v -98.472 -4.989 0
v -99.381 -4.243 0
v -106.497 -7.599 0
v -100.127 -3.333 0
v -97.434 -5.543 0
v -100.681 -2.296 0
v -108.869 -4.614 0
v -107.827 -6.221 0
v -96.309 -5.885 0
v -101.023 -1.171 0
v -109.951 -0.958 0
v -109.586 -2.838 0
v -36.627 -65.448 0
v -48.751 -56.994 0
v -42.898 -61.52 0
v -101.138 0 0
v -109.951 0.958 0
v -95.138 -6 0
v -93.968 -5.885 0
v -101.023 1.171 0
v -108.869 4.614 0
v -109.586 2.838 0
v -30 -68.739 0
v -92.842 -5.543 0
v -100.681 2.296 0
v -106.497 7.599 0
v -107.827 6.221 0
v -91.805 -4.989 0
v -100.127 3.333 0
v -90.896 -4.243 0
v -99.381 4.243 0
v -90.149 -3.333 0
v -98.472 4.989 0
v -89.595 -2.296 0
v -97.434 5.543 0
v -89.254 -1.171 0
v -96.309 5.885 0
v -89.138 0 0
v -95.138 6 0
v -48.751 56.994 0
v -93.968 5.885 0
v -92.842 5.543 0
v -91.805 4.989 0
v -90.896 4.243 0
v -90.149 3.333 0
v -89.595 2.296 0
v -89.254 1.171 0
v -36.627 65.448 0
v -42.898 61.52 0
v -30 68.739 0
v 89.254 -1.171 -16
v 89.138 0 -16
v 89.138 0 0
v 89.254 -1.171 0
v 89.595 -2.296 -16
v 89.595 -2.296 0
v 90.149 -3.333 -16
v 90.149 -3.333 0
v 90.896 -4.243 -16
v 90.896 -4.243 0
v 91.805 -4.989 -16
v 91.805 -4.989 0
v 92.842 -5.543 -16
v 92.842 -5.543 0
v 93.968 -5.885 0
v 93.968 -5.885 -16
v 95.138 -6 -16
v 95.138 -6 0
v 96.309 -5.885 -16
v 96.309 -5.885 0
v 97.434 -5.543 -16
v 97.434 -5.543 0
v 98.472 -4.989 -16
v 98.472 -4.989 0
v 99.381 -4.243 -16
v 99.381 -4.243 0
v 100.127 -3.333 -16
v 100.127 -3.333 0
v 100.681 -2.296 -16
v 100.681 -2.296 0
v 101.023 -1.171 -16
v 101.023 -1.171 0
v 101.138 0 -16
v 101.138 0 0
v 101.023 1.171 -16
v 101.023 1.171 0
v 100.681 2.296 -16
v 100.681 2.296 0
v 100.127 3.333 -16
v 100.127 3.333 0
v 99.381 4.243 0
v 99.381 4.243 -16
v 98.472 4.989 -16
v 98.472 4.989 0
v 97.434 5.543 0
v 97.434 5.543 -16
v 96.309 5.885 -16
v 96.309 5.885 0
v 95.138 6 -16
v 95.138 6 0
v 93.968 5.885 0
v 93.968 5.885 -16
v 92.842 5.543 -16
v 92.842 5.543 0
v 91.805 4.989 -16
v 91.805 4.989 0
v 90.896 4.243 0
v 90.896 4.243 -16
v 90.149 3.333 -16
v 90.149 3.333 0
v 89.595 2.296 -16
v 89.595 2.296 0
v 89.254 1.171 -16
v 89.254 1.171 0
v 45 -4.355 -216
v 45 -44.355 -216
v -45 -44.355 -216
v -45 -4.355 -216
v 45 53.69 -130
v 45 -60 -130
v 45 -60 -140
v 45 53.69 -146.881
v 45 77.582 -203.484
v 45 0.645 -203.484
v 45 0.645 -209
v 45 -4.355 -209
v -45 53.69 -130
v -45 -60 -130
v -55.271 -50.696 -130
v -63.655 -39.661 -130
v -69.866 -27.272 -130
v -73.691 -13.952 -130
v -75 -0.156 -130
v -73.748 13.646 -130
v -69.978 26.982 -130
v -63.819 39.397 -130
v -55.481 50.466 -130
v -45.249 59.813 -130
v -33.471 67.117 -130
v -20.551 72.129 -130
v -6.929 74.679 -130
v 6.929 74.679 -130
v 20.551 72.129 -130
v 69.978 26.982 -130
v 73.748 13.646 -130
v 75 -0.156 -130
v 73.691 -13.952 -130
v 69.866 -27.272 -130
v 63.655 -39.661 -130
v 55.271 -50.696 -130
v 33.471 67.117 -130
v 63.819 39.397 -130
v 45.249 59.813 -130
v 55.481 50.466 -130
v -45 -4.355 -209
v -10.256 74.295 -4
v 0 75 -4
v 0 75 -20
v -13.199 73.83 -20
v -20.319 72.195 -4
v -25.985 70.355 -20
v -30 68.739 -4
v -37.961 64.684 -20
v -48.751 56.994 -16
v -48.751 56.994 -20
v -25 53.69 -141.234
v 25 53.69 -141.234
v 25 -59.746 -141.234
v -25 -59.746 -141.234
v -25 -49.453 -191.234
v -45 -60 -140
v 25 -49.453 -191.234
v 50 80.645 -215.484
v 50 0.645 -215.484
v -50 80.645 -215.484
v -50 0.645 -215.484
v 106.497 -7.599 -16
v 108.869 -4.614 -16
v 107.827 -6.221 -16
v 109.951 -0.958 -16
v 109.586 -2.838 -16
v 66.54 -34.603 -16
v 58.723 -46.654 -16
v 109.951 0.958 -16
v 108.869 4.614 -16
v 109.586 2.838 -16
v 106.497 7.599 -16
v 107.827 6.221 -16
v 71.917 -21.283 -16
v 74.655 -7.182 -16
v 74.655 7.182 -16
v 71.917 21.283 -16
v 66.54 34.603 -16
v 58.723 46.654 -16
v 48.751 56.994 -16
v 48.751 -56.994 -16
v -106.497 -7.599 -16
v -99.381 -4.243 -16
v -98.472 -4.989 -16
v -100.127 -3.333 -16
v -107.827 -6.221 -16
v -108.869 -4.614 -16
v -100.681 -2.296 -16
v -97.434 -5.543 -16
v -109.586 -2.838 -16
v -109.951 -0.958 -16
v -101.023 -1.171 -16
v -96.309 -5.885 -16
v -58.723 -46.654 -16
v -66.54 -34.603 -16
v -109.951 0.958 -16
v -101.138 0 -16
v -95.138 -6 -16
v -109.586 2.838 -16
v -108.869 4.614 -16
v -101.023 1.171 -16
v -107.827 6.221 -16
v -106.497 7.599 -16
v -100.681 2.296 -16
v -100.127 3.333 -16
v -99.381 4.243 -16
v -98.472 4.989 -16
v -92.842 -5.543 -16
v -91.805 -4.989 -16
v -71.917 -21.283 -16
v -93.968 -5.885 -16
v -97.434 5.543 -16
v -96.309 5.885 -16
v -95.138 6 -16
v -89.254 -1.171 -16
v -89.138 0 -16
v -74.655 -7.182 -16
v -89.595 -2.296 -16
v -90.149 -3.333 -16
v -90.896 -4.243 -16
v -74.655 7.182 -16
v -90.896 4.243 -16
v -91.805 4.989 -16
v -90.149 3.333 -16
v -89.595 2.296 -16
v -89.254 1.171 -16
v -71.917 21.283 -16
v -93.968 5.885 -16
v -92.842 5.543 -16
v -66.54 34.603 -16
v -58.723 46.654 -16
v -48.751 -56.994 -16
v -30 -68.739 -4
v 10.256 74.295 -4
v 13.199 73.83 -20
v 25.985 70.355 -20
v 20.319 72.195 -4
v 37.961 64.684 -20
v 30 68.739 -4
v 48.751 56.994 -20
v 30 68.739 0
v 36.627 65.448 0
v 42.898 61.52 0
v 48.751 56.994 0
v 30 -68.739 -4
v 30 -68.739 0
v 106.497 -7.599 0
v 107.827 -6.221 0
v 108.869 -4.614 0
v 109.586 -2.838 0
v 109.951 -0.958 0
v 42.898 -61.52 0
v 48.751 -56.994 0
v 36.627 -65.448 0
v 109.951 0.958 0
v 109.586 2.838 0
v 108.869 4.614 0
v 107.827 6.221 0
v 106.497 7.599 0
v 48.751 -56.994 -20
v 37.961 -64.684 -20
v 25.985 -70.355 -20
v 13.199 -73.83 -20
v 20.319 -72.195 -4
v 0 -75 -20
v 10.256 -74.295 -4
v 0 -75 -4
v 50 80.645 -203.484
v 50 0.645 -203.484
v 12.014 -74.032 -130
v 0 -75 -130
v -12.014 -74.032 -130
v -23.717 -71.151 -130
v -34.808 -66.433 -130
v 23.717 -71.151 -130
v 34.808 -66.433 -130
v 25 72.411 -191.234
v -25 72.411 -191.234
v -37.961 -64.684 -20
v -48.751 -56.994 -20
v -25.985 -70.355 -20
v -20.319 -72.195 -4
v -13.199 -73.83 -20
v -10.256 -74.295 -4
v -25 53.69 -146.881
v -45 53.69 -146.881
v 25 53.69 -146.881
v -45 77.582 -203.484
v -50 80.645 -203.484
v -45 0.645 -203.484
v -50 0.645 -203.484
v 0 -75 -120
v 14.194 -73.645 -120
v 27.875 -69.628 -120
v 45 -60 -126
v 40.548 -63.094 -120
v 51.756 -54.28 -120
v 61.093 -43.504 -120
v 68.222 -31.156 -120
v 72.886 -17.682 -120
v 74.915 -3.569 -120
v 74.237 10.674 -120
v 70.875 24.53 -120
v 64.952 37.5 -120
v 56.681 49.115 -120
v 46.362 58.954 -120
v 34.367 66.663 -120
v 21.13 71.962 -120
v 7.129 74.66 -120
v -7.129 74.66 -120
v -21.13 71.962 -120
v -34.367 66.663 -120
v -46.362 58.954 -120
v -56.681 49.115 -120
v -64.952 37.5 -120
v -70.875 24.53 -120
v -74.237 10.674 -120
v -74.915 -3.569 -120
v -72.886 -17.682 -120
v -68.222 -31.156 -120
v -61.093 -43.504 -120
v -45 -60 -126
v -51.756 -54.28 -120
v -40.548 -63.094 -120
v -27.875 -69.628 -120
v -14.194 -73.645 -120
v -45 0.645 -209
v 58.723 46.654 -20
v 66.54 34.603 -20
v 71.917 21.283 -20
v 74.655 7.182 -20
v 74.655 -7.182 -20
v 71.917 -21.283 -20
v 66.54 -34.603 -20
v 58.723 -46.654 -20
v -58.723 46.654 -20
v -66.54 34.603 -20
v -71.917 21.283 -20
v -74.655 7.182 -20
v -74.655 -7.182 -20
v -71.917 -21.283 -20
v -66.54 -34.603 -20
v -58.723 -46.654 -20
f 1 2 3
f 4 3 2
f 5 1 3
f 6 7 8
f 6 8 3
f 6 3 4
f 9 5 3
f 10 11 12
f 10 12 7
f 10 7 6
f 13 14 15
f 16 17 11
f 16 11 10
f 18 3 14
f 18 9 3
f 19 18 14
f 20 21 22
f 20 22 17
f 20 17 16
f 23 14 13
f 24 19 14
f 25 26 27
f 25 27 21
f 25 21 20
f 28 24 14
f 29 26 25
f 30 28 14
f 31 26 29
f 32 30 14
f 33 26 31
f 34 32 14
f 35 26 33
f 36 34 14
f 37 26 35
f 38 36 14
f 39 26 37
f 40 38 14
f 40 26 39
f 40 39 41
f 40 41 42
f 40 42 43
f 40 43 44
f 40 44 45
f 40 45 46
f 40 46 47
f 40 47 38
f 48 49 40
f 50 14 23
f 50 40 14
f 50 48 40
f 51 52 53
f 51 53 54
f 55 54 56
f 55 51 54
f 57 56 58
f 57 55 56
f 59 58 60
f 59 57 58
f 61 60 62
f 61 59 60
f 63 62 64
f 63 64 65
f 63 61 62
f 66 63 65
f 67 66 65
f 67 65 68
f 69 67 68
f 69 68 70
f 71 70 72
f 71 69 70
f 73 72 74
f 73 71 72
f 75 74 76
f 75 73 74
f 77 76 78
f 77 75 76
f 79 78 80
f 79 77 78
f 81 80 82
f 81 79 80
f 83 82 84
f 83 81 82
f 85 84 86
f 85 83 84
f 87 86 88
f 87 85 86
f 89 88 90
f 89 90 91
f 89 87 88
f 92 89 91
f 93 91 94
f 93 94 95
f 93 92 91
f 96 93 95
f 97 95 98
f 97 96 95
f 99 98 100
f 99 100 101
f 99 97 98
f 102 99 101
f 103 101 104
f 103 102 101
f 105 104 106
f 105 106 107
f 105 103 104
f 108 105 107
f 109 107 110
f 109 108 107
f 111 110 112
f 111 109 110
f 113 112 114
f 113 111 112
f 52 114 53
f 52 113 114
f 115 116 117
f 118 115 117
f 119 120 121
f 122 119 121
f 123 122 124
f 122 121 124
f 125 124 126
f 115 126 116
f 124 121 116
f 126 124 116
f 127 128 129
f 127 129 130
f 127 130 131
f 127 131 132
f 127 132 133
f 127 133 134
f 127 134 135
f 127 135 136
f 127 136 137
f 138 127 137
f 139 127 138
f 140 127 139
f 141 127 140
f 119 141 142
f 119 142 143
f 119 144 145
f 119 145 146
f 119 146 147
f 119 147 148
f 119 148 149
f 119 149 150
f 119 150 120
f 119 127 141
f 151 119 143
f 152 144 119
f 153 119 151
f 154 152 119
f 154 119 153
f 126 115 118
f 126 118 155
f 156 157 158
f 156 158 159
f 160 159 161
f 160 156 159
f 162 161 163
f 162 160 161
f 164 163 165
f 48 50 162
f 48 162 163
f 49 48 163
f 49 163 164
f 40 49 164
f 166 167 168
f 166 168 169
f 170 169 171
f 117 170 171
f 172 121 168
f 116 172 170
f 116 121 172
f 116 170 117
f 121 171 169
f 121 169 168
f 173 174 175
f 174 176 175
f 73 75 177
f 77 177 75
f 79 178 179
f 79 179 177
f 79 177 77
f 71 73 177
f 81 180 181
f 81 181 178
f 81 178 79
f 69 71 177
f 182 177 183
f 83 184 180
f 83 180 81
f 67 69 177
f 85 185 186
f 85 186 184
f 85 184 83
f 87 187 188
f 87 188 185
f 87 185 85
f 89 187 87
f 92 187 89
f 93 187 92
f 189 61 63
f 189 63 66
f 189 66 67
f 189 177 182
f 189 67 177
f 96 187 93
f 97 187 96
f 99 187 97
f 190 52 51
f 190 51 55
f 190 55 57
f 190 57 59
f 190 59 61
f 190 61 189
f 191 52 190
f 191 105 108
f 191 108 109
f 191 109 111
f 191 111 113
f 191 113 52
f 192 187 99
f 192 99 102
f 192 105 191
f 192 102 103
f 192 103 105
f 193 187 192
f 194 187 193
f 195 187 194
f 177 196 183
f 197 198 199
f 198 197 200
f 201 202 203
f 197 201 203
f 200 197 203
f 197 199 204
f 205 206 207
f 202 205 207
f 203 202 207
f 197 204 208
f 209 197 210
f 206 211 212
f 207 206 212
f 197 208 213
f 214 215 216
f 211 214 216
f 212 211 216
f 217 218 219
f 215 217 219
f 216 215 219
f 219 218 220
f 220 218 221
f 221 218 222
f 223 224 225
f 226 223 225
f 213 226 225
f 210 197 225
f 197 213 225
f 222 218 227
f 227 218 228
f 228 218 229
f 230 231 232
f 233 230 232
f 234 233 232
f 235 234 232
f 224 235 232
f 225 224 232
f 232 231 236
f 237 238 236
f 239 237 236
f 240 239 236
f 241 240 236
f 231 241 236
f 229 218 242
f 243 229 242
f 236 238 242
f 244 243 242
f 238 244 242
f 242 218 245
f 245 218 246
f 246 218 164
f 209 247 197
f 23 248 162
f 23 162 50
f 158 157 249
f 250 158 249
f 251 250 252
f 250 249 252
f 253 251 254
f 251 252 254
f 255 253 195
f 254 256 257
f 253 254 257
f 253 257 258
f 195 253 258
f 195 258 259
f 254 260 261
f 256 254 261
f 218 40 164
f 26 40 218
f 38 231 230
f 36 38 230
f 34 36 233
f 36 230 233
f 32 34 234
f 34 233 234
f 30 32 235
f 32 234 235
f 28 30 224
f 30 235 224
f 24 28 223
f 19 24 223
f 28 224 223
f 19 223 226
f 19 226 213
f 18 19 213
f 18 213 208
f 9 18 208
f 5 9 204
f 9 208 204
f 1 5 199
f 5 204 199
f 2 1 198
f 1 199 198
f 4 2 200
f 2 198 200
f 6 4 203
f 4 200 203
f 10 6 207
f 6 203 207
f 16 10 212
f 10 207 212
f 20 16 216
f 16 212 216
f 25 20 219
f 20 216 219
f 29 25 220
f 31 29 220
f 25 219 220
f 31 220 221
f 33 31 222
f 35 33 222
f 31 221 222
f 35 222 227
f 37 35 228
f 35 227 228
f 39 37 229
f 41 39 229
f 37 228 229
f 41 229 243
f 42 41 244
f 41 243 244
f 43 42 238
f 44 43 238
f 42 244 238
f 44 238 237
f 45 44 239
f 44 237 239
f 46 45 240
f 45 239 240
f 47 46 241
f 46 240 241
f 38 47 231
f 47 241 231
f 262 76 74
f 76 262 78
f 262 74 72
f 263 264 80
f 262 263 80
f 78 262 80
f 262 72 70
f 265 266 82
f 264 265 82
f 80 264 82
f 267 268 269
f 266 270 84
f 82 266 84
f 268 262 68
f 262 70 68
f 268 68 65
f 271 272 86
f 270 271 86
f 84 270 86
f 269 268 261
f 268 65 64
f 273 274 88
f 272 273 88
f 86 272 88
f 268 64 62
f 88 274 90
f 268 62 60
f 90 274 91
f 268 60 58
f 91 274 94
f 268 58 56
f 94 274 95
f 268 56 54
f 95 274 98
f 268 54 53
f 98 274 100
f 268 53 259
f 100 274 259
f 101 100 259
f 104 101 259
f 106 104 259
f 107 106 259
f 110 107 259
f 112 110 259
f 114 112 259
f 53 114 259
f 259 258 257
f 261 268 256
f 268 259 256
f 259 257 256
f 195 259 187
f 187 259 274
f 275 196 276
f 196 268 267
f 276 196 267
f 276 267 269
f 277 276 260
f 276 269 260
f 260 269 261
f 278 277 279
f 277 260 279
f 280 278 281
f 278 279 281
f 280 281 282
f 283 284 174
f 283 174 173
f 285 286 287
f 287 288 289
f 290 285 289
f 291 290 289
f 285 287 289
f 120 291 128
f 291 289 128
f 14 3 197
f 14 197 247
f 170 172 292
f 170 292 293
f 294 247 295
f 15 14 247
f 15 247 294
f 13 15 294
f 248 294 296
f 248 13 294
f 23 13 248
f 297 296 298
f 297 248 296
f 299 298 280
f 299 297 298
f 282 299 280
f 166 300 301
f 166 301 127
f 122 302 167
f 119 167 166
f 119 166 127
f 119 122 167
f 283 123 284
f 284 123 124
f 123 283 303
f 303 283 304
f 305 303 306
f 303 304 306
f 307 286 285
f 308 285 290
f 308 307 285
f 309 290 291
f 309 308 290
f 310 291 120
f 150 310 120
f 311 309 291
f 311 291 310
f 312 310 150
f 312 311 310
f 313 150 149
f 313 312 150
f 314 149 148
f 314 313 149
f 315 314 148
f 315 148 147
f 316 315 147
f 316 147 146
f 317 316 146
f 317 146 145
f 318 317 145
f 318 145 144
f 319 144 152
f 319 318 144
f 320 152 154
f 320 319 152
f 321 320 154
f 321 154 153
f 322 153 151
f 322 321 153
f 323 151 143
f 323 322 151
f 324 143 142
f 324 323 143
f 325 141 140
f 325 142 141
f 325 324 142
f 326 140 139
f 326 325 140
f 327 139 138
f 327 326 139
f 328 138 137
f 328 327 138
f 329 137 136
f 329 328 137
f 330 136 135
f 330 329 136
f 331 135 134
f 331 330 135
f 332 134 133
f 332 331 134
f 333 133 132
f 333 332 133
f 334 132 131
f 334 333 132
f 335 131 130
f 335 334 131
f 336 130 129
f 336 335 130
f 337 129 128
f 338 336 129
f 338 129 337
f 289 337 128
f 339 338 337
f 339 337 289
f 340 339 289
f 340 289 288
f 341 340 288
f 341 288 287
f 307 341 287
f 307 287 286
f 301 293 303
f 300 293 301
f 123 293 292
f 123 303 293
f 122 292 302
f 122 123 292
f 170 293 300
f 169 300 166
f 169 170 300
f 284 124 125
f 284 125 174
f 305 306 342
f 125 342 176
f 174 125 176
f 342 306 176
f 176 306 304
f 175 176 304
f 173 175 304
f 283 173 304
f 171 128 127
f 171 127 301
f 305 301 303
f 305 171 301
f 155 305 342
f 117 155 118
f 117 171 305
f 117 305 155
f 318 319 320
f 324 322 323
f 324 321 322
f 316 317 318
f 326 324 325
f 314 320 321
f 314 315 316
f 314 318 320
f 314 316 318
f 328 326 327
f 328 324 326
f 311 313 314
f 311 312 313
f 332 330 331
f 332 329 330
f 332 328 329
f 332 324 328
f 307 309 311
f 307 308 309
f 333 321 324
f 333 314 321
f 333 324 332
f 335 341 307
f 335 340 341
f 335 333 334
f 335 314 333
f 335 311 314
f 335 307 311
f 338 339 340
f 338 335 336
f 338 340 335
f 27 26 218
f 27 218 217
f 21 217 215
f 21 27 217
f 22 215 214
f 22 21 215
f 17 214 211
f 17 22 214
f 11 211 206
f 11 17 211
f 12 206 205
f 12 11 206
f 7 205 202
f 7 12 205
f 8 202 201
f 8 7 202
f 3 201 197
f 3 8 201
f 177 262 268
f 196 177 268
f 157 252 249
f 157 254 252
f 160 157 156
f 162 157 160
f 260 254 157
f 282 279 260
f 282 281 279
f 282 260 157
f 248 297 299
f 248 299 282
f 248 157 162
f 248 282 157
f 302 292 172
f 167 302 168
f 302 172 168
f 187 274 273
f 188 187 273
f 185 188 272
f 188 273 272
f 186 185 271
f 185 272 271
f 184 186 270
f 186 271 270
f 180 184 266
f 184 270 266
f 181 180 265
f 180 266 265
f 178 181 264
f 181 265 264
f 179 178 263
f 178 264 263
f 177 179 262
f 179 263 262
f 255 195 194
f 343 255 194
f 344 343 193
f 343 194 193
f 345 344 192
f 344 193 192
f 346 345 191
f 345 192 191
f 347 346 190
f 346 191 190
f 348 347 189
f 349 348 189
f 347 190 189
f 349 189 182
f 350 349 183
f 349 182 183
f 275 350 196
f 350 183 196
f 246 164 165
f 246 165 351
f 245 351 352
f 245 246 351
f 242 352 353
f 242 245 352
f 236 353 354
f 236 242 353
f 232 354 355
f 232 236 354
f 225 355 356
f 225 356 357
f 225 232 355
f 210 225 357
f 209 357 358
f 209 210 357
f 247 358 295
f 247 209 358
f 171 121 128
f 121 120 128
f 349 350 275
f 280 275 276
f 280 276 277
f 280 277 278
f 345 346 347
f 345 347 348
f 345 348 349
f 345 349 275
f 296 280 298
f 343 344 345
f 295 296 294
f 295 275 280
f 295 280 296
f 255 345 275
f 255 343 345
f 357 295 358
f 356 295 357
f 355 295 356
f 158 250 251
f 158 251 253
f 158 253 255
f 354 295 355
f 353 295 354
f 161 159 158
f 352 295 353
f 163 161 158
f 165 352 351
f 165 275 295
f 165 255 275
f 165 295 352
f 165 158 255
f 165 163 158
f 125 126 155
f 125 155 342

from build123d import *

# Parameters (mm, degrees)
F1_DEPTH  = 16
F2_DEPTH  = 20
F3_R      = 6
F4_DEPTH  = 16
F5_W      = 30
F5_H      = 4
F6_DEPTH  = 75
F8_R      = 75
F9_DEPTH  = 10
F12_DEPTH = 60
F13_DEPTH = 77.8
F15_DEPTH = 100
F16_W     = 77.1548634648
F16_H     = 3
F17_DEPTH = 45
F19_DEPTH = 50
F20_W     = 25
F20_H     = 50
F21_DEPTH = 80
F22_DEPTH = 80


with BuildPart() as f1:
    # F0 (on Top) → F1 (new body)
    with BuildSketch(Plane.XY):
        with BuildLine():
            ThreePointArc((-48.751355202, -56.9939063933), (-75, 0), (-48.751355202, 56.9939063933))
            Line((-48.751355202, 56.9939063933), (-106.4974008694, 7.5991875191))
            ThreePointArc((-106.4974008694, 7.5991875191), (-109.9972201758, 0), (-106.4974008694, -7.5991875191))
            Line((-106.4974008694, -7.5991875191), (-48.751355202, -56.9939063933))
        make_face()
    extrude(amount=-F1_DEPTH)

    # F0 (on Top) → F2 (join)
    with BuildSketch(Plane.XY):
        with BuildLine():
            Line((0, -75), (0, 75))
            ThreePointArc((0, 75), (-25.9851594232, 70.354612427), (-48.751355202, 56.9939063933))
            ThreePointArc((-48.751355202, 56.9939063933), (-75, 0), (-48.751355202, -56.9939063933))
            ThreePointArc((-48.751355202, -56.9939063933), (-25.9851594232, -70.354612427), (0, -75))
        make_face()
    extrude(amount=-F2_DEPTH)

    # F3 (on face) → F4 (cut)
    with BuildSketch(Plane(origin=(0, 0, -16), x_dir=(1, 0, 0), z_dir=(0, 0, -1))):
        with Locations((-95.1382219791, 0)):
            Circle(F3_R)
    extrude(amount=-F4_DEPTH, mode=Mode.SUBTRACT)

    # F5 (on Front) → F6 (cut, symmetric)
    with BuildSketch(Plane.XZ):
        with Locations((-15, -2)):
            Rectangle(F5_W, F5_H)
    extrude(amount=F6_DEPTH, both=True, mode=Mode.SUBTRACT)

    # F7: F1 across face


with BuildPart() as f1_1:
    add(f1.part)
    add(f1.part.mirror(Plane(origin=(0, 0, -12), x_dir=(0, 1, 0), z_dir=(1, 0, 0))))


with BuildPart() as f9:
    # F8 (on face) → F9 (new body)
    with BuildSketch(Plane(origin=(0, 0, -20), x_dir=(1, 0, 0), z_dir=(0, 0, -1))):
        Circle(F8_R)
    extrude(amount=F9_DEPTH)


with BuildPart() as f9_1:
    # F10: moved
    add(f9.part.moved(Location((0, 0, -100))))

    # F11 (on Front) → F12 (join)
    with BuildSketch(Plane.XZ):
        Polygon((0, -126), (-45, -126), (-45, -216), (45, -216), (45, -126), align=None)
    extrude(amount=F12_DEPTH)

    # F13 (add): a face of the model
    f13_faces = [f9_1.faces().sort_by_distance(p)[0] for p in [
        (0, 0, -173),
    ]]
    extrude(f13_faces, amount=F13_DEPTH)

    # F14 (on face) → F15 (cut)
    with BuildSketch(Plane.XY.offset(-120)):
        with BuildLine():
            ThreePointArc((75, 0), (53.033008589, -53.033008589), (0, -75))
            Line((0, -75), (93.311317265, -75))
            Line((93.311317265, -75), (93.311317265, 95.2438786626))
            Line((93.311317265, 95.2438786626), (0, 95.2438786626))
            Line((0, 95.2438786626), (0, 75))
            ThreePointArc((0, 75), (53.033008589, 53.033008589), (75, 0))
        make_face()
        with BuildLine():
            Line((0, 75), (0, -75))
            ThreePointArc((0, -75), (53.033008589, -53.033008589), (75, 0))
            ThreePointArc((75, 0), (53.033008589, 53.033008589), (0, 75))
        make_face()
    extrude(amount=-F15_DEPTH, mode=Mode.SUBTRACT)

    # F16 (on face) → F17 (cut)
    with BuildSketch(Plane(origin=(-45, 0, 0), x_dir=(0, -1, 0), z_dir=(-1, 0, 0))):
        Polygon((-77.8, -130), (-77.8, -204), (-53.6902993917, -146.880954504), (-53.6902993917, -130), align=None)
        with Locations((-39.2225682676, -214.5)):
            Rectangle(F16_W, F16_H)
        Polygon((60, -216), (60, -140), (44.3548634648, -216), align=None)
        Polygon((-0.6451365352, -216), (4.3548634648, -216), (4.3548634648, -213), (4.3548634648, -209), (-0.6451365352, -209), (-0.6451365352, -213), align=None)
    extrude(amount=-F17_DEPTH, mode=Mode.SUBTRACT)

    # F18 (on face) → F19 (join)
    with BuildSketch(Plane.YZ):
        Polygon((80.6451365352, -203.4836058617), (77.8, -203.4836058617), (77.5820322808, -203.4836058617), (77.8, -204), (77.8, -213), (0.6451365352, -213), (0.6451365352, -215.4836058617), (80.6451365352, -215.4836058617), align=None)
        Polygon((77.8, -204), (77.5820322808, -203.4836058617), (0.6451365352, -203.4836058617), (0.6451365352, -209), (0.6451365352, -213), (77.8, -213), align=None)
    extrude(amount=-F19_DEPTH)

    # F20 (on Front) → F21 (cut)
    with BuildSketch(Plane.XZ):
        with Locations((-12.5, -166.2339031696)):
            Rectangle(F20_W, F20_H)
    extrude(amount=-F21_DEPTH, mode=Mode.SUBTRACT)

    # F22 (cut): a face of the model
    f22_faces = [f9_1.faces().sort_by_distance(p)[0] for p in [
        (-12.5, 0, -166.2339031696),
    ]]
    extrude(f22_faces, amount=-F22_DEPTH, mode=Mode.SUBTRACT)

    # F23: F9 across face


with BuildPart() as f9_2:
    add(f9_1.part)
    add(f9_1.part.mirror(Plane(origin=(0, 15.3582634866, -203.4262275083), x_dir=(0, 1, 0), z_dir=(1, 0, 0))))


solid = Compound([f1_1.part, f9_2.part])
